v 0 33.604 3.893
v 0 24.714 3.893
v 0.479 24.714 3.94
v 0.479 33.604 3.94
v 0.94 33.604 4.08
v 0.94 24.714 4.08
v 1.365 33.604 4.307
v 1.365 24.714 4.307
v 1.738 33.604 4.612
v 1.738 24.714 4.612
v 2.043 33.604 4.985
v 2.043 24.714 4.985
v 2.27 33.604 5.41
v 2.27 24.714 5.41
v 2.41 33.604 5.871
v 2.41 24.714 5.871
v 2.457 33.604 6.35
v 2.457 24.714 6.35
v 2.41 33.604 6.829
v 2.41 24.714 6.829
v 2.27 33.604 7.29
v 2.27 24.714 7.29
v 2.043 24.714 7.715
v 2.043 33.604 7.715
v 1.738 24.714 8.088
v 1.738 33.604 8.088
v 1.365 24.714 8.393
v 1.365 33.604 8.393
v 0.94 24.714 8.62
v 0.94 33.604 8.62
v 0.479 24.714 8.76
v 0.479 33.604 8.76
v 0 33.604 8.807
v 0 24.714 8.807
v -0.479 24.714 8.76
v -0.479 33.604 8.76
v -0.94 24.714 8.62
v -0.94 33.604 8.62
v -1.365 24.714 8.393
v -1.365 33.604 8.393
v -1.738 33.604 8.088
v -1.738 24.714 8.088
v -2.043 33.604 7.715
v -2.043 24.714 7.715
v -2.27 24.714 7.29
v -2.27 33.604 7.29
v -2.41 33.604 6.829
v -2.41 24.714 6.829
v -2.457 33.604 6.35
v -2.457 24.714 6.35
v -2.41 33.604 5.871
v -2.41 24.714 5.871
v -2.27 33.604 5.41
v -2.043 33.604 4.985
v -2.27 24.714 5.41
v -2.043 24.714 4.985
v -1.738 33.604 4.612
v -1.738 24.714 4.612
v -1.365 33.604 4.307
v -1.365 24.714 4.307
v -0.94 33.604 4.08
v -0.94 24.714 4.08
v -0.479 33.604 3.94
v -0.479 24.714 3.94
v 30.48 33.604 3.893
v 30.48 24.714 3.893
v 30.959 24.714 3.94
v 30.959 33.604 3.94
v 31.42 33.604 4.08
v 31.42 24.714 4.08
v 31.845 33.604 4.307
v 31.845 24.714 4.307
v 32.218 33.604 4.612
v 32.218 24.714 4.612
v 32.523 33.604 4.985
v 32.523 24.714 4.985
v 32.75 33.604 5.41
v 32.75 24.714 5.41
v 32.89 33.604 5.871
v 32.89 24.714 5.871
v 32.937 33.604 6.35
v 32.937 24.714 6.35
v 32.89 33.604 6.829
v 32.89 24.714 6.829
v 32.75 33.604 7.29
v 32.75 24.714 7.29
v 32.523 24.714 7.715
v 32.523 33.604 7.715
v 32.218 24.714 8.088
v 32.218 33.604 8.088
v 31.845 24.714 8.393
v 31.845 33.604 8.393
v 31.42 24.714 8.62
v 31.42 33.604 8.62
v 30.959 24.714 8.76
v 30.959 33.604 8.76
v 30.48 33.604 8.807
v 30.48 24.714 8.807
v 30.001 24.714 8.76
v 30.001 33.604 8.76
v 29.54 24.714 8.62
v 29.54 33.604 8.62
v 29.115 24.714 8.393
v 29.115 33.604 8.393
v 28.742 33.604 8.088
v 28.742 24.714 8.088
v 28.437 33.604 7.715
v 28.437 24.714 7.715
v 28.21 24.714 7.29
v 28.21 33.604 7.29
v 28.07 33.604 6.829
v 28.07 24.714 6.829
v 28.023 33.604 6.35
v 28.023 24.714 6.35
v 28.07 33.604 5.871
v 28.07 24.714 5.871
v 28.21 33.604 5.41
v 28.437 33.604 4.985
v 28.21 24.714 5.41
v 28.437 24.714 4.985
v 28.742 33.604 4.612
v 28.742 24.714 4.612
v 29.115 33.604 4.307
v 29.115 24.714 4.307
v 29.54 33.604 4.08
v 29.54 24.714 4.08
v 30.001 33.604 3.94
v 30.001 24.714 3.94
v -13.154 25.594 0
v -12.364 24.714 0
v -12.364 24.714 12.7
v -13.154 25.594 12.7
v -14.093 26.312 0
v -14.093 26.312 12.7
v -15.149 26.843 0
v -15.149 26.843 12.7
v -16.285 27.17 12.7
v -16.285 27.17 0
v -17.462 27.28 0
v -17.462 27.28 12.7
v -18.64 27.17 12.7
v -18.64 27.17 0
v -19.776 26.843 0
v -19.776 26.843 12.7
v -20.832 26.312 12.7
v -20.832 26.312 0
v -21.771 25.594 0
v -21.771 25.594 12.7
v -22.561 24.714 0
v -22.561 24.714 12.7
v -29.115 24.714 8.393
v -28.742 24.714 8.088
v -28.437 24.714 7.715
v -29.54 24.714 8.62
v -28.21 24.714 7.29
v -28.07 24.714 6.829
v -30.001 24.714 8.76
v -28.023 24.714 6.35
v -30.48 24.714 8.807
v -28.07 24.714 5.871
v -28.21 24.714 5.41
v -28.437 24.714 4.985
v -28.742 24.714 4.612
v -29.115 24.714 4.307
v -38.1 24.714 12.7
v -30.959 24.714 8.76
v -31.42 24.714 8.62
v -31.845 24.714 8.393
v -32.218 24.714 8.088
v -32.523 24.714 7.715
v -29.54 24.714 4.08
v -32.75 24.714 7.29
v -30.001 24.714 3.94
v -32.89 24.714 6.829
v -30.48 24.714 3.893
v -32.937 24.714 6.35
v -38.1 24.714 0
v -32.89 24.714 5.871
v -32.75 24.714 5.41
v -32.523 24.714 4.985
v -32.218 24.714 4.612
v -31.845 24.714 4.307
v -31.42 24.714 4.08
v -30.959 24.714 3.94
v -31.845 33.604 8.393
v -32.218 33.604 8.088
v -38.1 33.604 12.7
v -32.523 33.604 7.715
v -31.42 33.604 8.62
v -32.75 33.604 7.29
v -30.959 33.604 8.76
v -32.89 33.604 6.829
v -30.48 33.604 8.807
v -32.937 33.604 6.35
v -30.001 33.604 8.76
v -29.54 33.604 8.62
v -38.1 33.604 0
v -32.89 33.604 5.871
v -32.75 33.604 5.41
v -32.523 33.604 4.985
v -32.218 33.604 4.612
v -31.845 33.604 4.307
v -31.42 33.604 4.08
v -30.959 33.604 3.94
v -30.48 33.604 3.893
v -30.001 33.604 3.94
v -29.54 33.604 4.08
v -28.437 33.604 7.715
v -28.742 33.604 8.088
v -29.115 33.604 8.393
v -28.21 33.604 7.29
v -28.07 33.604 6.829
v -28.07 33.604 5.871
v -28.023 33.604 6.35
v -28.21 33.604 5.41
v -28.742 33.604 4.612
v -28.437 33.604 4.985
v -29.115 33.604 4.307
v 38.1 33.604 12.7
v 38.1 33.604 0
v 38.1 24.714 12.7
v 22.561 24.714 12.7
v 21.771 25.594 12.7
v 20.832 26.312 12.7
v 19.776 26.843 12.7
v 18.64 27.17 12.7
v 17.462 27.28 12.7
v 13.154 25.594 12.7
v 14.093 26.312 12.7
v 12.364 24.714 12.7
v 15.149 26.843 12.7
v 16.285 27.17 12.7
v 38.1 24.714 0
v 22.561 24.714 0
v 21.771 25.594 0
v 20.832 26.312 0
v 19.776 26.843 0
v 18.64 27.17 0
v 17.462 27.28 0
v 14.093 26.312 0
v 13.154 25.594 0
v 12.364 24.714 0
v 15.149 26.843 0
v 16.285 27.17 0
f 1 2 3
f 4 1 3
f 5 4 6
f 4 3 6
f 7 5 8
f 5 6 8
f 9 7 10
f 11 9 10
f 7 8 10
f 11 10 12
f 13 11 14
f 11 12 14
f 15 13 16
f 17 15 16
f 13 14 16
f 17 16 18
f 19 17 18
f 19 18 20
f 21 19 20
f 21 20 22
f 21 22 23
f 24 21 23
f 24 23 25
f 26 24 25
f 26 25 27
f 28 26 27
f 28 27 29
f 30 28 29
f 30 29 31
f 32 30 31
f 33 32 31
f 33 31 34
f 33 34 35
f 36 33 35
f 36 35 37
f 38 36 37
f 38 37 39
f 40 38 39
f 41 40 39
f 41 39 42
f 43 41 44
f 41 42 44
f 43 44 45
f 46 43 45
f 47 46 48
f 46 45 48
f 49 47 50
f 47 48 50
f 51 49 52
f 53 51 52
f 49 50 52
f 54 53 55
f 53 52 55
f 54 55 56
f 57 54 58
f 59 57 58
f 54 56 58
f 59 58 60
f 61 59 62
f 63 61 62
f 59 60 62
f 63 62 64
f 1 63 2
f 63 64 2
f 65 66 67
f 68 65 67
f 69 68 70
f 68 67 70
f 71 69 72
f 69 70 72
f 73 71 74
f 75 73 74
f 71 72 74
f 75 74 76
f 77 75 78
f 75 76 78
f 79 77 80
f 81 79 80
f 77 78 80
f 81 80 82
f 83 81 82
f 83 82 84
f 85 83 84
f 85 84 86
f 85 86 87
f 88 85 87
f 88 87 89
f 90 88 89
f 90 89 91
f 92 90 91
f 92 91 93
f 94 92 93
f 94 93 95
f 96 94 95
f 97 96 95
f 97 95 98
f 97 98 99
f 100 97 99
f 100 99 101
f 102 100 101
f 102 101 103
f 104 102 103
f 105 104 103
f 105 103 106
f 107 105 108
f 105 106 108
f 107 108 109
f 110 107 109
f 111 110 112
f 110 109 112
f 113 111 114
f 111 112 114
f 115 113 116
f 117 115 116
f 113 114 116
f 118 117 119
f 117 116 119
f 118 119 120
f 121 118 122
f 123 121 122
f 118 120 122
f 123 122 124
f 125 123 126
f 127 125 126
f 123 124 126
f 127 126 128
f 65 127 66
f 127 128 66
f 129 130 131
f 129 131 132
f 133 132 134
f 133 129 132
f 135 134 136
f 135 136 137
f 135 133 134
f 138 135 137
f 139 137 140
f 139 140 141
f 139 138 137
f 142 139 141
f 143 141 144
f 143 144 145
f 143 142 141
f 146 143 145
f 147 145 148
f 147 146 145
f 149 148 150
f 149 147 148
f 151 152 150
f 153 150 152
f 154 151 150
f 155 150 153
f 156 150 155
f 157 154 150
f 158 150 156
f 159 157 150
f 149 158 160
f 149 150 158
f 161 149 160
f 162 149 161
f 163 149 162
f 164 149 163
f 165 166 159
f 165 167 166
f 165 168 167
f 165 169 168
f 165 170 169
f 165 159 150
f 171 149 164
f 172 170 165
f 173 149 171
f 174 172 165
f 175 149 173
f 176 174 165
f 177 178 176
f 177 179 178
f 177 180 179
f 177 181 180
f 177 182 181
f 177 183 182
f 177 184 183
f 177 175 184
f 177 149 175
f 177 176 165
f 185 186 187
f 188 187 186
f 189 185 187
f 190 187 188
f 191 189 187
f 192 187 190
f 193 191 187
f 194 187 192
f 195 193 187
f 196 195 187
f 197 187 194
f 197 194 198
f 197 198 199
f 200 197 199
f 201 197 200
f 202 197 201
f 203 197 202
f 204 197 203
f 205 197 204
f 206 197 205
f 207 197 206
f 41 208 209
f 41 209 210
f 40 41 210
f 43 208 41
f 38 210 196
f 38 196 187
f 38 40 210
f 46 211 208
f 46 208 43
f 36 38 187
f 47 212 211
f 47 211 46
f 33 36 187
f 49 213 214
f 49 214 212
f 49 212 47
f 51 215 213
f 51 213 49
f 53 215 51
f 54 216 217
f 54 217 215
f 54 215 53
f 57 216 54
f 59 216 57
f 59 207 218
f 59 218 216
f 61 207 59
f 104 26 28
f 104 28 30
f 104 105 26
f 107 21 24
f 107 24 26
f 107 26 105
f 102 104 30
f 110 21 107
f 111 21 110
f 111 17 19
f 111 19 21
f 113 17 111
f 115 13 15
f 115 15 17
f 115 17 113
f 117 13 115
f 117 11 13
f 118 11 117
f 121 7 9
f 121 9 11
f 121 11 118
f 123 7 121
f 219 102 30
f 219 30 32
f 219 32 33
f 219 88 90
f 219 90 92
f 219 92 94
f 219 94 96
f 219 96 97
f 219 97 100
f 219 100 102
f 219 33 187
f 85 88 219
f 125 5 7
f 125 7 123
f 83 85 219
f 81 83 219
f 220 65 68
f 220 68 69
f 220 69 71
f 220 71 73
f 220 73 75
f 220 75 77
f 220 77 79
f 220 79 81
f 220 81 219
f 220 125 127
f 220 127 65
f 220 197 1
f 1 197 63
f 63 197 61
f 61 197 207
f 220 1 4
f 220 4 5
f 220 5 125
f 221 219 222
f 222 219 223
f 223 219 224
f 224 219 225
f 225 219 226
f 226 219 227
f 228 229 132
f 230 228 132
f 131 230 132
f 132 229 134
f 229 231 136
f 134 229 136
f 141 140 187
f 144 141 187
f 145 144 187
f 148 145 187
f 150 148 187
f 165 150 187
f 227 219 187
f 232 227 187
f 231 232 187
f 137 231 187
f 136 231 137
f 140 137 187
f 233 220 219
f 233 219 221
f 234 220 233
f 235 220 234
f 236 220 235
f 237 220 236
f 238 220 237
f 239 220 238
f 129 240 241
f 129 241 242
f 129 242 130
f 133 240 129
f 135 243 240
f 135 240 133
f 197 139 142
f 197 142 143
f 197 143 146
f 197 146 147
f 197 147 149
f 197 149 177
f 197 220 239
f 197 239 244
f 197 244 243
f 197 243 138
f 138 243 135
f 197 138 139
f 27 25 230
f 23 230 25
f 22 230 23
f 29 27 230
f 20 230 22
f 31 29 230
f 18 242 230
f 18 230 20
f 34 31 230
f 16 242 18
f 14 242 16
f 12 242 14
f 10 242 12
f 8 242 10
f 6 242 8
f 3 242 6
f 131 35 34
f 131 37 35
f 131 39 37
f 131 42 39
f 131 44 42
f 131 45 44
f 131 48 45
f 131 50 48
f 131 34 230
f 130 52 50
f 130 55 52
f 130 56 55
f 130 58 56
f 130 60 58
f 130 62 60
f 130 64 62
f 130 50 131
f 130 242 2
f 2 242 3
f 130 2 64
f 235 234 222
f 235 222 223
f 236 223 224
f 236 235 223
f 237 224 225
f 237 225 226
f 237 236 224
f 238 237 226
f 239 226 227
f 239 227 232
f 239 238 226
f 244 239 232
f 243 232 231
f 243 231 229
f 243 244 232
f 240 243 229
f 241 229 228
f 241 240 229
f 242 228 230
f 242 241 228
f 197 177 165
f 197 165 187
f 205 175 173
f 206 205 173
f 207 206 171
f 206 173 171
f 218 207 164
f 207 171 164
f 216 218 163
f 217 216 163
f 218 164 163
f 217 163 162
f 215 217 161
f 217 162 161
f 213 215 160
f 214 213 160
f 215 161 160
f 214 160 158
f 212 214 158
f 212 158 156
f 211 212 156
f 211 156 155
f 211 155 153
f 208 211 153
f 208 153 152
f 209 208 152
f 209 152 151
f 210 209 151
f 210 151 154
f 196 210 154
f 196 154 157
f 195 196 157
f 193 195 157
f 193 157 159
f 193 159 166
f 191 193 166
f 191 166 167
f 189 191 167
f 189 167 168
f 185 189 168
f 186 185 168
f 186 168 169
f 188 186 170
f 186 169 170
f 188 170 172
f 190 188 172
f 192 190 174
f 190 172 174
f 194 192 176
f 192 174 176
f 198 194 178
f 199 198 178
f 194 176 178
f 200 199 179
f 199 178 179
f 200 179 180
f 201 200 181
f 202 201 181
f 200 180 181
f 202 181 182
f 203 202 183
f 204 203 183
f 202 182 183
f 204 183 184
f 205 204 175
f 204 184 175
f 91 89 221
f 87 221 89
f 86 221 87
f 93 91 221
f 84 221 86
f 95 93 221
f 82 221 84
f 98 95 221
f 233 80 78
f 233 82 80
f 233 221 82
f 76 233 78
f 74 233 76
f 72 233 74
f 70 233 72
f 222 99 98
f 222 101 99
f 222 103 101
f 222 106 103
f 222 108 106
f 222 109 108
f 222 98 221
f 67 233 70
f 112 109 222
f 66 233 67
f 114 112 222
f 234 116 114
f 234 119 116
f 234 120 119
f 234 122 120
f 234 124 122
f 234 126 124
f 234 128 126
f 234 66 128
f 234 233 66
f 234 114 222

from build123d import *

# Parameters (mm, degrees)
BOSS_EXTRUDE1_DEPTH          = 12.7
F_10_0_1935_DIAMETER_HOLE1_D = 4.9149


with BuildPart() as part:
    # Sketch1 → Boss-Extrude1 (new body)
    with BuildSketch(Plane.XY):
        with BuildLine():
            Line((38.1, 33.6042), (38.1, 24.7142))
            Line((38.1, 24.7142), (22.561451151, 24.7142))
            ThreePointArc((22.561451151, 24.7142), (17.4625, 27.2796), (12.363548849, 24.7142))
            Line((12.363548849, 24.7142), (-12.363548849, 24.7142))
            ThreePointArc((-12.363548849, 24.7142), (-17.4625, 27.2796), (-22.561451151, 24.7142))
            Line((-22.561451151, 24.7142), (-38.1, 24.7142))
            Line((-38.1, 24.7142), (-38.1, 33.6042))
            Line((-38.1, 33.6042), (38.1, 33.6042))
        make_face()
    extrude(amount=BOSS_EXTRUDE1_DEPTH)

    # #10 (0.1935) Diameter Hole1 (through all)
    with Locations(Plane(origin=(-30.48, 33.6042, 6.35), x_dir=(0, 0, 1), z_dir=(0, 1, 0))):
        with Locations((0, 0), (0, 30.48), (0, 60.96)):
            Hole(F_10_0_1935_DIAMETER_HOLE1_D / 2)


solid = part.part
